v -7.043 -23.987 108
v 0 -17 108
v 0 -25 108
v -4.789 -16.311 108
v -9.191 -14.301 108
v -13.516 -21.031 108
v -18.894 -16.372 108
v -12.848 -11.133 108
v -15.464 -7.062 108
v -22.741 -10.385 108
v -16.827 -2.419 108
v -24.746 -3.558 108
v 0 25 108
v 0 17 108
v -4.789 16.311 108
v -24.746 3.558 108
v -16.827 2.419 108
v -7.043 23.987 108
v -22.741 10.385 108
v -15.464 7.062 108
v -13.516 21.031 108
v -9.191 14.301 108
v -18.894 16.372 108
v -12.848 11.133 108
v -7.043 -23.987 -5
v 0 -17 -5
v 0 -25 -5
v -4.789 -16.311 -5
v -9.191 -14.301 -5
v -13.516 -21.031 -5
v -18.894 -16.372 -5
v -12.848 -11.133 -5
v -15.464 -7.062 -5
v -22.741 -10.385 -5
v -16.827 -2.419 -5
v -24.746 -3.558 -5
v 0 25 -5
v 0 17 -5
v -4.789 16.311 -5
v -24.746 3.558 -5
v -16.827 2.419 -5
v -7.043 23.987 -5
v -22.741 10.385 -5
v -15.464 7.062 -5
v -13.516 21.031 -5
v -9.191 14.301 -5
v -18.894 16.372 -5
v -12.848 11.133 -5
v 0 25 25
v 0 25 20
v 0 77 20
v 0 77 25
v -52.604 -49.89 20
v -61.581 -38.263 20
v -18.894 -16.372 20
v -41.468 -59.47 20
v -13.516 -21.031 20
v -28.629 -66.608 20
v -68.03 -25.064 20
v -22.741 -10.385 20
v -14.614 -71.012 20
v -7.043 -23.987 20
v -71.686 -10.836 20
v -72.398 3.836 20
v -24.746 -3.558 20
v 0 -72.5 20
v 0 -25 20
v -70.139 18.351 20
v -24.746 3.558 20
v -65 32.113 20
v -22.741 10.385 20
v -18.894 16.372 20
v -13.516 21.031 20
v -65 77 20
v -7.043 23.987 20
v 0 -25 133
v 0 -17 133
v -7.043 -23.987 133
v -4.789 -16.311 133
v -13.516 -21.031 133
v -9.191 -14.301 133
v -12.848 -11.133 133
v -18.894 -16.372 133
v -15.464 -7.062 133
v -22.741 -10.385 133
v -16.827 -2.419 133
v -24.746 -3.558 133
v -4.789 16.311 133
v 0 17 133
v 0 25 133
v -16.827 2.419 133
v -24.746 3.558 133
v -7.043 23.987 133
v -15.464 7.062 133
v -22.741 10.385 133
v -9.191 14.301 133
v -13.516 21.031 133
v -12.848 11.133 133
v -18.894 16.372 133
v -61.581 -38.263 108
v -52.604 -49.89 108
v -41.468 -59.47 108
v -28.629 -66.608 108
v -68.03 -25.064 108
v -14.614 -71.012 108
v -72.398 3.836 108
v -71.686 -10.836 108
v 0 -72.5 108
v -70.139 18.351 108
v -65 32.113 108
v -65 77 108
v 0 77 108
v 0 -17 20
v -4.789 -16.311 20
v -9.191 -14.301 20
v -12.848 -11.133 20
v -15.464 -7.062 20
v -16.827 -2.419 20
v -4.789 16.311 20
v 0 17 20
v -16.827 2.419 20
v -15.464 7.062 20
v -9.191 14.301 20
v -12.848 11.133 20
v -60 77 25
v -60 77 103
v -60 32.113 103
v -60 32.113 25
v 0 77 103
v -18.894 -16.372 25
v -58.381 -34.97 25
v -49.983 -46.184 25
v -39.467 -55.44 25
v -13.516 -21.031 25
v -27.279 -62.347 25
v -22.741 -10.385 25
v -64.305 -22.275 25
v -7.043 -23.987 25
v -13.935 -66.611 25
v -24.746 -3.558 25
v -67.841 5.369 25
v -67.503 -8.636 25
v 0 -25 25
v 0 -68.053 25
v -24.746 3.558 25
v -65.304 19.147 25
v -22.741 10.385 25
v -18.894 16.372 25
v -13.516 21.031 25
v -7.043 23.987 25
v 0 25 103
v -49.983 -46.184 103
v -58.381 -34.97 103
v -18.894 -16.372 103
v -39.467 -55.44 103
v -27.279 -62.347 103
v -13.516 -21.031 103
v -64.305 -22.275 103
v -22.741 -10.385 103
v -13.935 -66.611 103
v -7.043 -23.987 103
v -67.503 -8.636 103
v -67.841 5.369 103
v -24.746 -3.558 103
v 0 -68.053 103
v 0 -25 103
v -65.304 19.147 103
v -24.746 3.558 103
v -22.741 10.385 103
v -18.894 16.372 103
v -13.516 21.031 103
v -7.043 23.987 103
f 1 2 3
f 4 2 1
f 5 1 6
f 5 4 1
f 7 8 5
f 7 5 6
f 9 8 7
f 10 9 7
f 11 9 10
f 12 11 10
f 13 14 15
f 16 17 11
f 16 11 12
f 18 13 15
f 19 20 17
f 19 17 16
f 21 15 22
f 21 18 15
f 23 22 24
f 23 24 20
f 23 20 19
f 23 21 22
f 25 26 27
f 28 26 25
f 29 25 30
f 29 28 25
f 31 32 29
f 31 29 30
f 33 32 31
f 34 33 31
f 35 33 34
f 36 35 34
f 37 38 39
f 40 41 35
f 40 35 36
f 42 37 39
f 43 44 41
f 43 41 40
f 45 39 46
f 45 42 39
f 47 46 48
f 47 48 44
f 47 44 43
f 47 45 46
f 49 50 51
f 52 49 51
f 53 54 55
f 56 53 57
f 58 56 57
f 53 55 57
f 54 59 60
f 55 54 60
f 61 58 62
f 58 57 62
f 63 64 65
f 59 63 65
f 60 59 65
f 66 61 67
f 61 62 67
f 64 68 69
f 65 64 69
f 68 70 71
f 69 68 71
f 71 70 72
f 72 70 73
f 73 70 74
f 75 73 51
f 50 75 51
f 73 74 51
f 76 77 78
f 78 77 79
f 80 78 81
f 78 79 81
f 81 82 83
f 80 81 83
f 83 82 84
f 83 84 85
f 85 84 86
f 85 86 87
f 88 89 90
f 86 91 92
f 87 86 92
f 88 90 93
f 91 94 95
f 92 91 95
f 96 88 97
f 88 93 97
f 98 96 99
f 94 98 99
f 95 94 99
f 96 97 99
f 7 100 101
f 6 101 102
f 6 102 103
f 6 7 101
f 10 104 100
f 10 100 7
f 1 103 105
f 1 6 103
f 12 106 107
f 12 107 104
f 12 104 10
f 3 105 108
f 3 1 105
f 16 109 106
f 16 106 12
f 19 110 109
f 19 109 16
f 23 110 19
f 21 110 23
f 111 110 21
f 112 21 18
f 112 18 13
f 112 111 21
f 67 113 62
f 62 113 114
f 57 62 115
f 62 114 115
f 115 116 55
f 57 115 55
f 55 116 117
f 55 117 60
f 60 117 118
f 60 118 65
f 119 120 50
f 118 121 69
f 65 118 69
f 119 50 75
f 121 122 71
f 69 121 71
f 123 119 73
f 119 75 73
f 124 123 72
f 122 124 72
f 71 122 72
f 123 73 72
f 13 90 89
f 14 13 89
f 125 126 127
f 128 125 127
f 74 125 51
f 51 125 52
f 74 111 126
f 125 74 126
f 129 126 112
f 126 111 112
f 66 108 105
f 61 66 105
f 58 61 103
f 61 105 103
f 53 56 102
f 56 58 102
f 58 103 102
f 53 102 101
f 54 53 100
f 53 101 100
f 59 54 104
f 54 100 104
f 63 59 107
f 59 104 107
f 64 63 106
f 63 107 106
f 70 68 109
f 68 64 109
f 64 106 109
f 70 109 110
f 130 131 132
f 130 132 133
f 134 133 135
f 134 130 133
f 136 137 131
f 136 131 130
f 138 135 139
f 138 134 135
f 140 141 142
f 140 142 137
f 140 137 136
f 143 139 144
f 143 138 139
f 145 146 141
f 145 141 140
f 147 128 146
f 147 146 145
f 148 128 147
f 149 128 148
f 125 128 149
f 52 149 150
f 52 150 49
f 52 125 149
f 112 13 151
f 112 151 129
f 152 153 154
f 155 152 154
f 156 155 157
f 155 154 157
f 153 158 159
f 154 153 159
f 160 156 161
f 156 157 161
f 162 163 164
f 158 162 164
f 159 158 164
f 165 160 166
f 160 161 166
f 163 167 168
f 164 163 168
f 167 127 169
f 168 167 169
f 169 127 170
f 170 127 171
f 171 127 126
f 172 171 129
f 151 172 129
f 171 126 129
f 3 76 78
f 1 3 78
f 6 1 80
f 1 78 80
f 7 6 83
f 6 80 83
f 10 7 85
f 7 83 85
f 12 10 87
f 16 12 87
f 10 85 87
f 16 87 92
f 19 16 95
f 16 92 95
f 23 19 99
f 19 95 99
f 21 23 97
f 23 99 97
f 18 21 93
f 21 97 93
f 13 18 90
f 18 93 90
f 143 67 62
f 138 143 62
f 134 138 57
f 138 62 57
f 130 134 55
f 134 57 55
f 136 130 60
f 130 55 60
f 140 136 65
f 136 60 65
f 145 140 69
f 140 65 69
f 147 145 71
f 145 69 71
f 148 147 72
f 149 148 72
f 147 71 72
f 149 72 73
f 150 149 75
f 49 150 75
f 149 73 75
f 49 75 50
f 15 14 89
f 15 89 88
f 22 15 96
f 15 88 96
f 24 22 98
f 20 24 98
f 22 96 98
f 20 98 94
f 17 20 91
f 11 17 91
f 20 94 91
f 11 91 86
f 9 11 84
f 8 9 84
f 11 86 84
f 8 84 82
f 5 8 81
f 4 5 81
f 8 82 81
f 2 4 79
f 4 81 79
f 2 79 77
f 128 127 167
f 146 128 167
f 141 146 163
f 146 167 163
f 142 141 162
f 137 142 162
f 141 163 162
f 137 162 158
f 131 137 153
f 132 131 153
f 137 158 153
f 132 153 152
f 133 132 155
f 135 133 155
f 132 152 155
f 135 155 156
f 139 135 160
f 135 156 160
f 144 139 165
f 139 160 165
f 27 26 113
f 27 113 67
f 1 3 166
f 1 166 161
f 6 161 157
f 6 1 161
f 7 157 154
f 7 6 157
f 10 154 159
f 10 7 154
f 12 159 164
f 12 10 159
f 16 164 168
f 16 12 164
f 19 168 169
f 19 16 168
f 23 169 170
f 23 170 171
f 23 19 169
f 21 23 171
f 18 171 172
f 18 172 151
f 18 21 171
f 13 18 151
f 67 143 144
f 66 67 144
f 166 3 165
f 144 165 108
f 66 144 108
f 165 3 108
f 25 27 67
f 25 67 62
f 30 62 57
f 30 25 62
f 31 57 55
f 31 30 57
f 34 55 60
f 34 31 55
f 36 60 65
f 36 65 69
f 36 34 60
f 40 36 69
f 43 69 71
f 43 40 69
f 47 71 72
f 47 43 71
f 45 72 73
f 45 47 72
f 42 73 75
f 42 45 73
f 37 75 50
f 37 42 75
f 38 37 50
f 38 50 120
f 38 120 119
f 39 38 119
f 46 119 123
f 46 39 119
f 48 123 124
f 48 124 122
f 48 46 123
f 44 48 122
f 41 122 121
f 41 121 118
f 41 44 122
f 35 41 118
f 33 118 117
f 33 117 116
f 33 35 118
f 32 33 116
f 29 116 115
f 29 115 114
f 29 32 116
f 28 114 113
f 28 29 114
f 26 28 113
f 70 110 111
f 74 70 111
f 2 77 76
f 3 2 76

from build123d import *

# Parameters (mm, degrees)
BOSS_EXTRUDE1_DEPTH      = 20
BOSS_EXTRUDE1_DEPTH_BACK = 5
BOSS_EXTRUDE2_DEPTH      = 5
BOSS_EXTRUDE3_DEPTH      = 78


with BuildPart() as part:
    # Sketch1 → Boss-Extrude1 (new, two sides: drawn at the far end of the back side and taken through both)
    with BuildSketch(Plane.XY.offset(-BOSS_EXTRUDE1_DEPTH_BACK)):
        with BuildLine():
            Line((0, 25), (0, 17))
            ThreePointArc((0, 17), (-17, 0), (0, -17))
            Line((0, -17), (0, -25))
            ThreePointArc((0, -25), (-25, 0), (0, 25))
        make_face()
    extrude(amount=BOSS_EXTRUDE1_DEPTH + BOSS_EXTRUDE1_DEPTH_BACK)


with BuildPart() as body_2:
    # Sketch2 → Boss-Extrude2 (new body)
    with BuildSketch(Plane.XY.offset(20)):
        with BuildLine():
            ThreePointArc((-65, 32.113081447), (-61.581037686, -38.262590053), (0, -72.5))
            Line((0, -72.5), (0, -34.821630737))
            Line((0, -34.821630737), (0, -25))
            ThreePointArc((0, -25), (-25, 0), (0, 25))
            Line((0, 25), (0, 77))
            Line((0, 77), (-65, 77))
            Line((-65, 77), (-65, 32.113081447))
        make_face()
    extrude(amount=BOSS_EXTRUDE2_DEPTH)


with BuildPart() as body_3:
    # Mirror5: mirrored copy
    add(body_2.part.mirror(Plane(origin=(0, 0, 64), x_dir=(1, 0, 0), z_dir=(0, 0, -1))))


with BuildPart() as body_4:
    # Mirror5 2: mirrored copy
    add(part.part.mirror(Plane(origin=(0, 0, 64), x_dir=(1, 0, 0), z_dir=(0, 0, -1))))


with BuildPart() as body_2_1:
    add(body_2.part)

    add(body_3.part)  # Boss-Extrude3 merges body 3
    # Sketch6 → Boss-Extrude3 (add)
    with BuildSketch(Plane(origin=(0, 0, 103), x_dir=(-1, 0, 0), z_dir=(0, 0, -1))):
        with BuildLine():
            Line((65, 32.113081447), (65, 77))
            Line((65, 77), (60, 77))
            Line((60, 77), (60, 32.113081447))
            ThreePointArc((60, 32.113081447), (58.380864924, -34.970339014), (0, -68.053287944))
            Line((0, -68.053287944), (0, -72.5))
            ThreePointArc((0, -72.5), (61.581037686, -38.262590053), (65, 32.113081447))
        make_face()
    extrude(amount=BOSS_EXTRUDE3_DEPTH)


solid = Compound([part.part, body_4.part, body_2_1.part])
